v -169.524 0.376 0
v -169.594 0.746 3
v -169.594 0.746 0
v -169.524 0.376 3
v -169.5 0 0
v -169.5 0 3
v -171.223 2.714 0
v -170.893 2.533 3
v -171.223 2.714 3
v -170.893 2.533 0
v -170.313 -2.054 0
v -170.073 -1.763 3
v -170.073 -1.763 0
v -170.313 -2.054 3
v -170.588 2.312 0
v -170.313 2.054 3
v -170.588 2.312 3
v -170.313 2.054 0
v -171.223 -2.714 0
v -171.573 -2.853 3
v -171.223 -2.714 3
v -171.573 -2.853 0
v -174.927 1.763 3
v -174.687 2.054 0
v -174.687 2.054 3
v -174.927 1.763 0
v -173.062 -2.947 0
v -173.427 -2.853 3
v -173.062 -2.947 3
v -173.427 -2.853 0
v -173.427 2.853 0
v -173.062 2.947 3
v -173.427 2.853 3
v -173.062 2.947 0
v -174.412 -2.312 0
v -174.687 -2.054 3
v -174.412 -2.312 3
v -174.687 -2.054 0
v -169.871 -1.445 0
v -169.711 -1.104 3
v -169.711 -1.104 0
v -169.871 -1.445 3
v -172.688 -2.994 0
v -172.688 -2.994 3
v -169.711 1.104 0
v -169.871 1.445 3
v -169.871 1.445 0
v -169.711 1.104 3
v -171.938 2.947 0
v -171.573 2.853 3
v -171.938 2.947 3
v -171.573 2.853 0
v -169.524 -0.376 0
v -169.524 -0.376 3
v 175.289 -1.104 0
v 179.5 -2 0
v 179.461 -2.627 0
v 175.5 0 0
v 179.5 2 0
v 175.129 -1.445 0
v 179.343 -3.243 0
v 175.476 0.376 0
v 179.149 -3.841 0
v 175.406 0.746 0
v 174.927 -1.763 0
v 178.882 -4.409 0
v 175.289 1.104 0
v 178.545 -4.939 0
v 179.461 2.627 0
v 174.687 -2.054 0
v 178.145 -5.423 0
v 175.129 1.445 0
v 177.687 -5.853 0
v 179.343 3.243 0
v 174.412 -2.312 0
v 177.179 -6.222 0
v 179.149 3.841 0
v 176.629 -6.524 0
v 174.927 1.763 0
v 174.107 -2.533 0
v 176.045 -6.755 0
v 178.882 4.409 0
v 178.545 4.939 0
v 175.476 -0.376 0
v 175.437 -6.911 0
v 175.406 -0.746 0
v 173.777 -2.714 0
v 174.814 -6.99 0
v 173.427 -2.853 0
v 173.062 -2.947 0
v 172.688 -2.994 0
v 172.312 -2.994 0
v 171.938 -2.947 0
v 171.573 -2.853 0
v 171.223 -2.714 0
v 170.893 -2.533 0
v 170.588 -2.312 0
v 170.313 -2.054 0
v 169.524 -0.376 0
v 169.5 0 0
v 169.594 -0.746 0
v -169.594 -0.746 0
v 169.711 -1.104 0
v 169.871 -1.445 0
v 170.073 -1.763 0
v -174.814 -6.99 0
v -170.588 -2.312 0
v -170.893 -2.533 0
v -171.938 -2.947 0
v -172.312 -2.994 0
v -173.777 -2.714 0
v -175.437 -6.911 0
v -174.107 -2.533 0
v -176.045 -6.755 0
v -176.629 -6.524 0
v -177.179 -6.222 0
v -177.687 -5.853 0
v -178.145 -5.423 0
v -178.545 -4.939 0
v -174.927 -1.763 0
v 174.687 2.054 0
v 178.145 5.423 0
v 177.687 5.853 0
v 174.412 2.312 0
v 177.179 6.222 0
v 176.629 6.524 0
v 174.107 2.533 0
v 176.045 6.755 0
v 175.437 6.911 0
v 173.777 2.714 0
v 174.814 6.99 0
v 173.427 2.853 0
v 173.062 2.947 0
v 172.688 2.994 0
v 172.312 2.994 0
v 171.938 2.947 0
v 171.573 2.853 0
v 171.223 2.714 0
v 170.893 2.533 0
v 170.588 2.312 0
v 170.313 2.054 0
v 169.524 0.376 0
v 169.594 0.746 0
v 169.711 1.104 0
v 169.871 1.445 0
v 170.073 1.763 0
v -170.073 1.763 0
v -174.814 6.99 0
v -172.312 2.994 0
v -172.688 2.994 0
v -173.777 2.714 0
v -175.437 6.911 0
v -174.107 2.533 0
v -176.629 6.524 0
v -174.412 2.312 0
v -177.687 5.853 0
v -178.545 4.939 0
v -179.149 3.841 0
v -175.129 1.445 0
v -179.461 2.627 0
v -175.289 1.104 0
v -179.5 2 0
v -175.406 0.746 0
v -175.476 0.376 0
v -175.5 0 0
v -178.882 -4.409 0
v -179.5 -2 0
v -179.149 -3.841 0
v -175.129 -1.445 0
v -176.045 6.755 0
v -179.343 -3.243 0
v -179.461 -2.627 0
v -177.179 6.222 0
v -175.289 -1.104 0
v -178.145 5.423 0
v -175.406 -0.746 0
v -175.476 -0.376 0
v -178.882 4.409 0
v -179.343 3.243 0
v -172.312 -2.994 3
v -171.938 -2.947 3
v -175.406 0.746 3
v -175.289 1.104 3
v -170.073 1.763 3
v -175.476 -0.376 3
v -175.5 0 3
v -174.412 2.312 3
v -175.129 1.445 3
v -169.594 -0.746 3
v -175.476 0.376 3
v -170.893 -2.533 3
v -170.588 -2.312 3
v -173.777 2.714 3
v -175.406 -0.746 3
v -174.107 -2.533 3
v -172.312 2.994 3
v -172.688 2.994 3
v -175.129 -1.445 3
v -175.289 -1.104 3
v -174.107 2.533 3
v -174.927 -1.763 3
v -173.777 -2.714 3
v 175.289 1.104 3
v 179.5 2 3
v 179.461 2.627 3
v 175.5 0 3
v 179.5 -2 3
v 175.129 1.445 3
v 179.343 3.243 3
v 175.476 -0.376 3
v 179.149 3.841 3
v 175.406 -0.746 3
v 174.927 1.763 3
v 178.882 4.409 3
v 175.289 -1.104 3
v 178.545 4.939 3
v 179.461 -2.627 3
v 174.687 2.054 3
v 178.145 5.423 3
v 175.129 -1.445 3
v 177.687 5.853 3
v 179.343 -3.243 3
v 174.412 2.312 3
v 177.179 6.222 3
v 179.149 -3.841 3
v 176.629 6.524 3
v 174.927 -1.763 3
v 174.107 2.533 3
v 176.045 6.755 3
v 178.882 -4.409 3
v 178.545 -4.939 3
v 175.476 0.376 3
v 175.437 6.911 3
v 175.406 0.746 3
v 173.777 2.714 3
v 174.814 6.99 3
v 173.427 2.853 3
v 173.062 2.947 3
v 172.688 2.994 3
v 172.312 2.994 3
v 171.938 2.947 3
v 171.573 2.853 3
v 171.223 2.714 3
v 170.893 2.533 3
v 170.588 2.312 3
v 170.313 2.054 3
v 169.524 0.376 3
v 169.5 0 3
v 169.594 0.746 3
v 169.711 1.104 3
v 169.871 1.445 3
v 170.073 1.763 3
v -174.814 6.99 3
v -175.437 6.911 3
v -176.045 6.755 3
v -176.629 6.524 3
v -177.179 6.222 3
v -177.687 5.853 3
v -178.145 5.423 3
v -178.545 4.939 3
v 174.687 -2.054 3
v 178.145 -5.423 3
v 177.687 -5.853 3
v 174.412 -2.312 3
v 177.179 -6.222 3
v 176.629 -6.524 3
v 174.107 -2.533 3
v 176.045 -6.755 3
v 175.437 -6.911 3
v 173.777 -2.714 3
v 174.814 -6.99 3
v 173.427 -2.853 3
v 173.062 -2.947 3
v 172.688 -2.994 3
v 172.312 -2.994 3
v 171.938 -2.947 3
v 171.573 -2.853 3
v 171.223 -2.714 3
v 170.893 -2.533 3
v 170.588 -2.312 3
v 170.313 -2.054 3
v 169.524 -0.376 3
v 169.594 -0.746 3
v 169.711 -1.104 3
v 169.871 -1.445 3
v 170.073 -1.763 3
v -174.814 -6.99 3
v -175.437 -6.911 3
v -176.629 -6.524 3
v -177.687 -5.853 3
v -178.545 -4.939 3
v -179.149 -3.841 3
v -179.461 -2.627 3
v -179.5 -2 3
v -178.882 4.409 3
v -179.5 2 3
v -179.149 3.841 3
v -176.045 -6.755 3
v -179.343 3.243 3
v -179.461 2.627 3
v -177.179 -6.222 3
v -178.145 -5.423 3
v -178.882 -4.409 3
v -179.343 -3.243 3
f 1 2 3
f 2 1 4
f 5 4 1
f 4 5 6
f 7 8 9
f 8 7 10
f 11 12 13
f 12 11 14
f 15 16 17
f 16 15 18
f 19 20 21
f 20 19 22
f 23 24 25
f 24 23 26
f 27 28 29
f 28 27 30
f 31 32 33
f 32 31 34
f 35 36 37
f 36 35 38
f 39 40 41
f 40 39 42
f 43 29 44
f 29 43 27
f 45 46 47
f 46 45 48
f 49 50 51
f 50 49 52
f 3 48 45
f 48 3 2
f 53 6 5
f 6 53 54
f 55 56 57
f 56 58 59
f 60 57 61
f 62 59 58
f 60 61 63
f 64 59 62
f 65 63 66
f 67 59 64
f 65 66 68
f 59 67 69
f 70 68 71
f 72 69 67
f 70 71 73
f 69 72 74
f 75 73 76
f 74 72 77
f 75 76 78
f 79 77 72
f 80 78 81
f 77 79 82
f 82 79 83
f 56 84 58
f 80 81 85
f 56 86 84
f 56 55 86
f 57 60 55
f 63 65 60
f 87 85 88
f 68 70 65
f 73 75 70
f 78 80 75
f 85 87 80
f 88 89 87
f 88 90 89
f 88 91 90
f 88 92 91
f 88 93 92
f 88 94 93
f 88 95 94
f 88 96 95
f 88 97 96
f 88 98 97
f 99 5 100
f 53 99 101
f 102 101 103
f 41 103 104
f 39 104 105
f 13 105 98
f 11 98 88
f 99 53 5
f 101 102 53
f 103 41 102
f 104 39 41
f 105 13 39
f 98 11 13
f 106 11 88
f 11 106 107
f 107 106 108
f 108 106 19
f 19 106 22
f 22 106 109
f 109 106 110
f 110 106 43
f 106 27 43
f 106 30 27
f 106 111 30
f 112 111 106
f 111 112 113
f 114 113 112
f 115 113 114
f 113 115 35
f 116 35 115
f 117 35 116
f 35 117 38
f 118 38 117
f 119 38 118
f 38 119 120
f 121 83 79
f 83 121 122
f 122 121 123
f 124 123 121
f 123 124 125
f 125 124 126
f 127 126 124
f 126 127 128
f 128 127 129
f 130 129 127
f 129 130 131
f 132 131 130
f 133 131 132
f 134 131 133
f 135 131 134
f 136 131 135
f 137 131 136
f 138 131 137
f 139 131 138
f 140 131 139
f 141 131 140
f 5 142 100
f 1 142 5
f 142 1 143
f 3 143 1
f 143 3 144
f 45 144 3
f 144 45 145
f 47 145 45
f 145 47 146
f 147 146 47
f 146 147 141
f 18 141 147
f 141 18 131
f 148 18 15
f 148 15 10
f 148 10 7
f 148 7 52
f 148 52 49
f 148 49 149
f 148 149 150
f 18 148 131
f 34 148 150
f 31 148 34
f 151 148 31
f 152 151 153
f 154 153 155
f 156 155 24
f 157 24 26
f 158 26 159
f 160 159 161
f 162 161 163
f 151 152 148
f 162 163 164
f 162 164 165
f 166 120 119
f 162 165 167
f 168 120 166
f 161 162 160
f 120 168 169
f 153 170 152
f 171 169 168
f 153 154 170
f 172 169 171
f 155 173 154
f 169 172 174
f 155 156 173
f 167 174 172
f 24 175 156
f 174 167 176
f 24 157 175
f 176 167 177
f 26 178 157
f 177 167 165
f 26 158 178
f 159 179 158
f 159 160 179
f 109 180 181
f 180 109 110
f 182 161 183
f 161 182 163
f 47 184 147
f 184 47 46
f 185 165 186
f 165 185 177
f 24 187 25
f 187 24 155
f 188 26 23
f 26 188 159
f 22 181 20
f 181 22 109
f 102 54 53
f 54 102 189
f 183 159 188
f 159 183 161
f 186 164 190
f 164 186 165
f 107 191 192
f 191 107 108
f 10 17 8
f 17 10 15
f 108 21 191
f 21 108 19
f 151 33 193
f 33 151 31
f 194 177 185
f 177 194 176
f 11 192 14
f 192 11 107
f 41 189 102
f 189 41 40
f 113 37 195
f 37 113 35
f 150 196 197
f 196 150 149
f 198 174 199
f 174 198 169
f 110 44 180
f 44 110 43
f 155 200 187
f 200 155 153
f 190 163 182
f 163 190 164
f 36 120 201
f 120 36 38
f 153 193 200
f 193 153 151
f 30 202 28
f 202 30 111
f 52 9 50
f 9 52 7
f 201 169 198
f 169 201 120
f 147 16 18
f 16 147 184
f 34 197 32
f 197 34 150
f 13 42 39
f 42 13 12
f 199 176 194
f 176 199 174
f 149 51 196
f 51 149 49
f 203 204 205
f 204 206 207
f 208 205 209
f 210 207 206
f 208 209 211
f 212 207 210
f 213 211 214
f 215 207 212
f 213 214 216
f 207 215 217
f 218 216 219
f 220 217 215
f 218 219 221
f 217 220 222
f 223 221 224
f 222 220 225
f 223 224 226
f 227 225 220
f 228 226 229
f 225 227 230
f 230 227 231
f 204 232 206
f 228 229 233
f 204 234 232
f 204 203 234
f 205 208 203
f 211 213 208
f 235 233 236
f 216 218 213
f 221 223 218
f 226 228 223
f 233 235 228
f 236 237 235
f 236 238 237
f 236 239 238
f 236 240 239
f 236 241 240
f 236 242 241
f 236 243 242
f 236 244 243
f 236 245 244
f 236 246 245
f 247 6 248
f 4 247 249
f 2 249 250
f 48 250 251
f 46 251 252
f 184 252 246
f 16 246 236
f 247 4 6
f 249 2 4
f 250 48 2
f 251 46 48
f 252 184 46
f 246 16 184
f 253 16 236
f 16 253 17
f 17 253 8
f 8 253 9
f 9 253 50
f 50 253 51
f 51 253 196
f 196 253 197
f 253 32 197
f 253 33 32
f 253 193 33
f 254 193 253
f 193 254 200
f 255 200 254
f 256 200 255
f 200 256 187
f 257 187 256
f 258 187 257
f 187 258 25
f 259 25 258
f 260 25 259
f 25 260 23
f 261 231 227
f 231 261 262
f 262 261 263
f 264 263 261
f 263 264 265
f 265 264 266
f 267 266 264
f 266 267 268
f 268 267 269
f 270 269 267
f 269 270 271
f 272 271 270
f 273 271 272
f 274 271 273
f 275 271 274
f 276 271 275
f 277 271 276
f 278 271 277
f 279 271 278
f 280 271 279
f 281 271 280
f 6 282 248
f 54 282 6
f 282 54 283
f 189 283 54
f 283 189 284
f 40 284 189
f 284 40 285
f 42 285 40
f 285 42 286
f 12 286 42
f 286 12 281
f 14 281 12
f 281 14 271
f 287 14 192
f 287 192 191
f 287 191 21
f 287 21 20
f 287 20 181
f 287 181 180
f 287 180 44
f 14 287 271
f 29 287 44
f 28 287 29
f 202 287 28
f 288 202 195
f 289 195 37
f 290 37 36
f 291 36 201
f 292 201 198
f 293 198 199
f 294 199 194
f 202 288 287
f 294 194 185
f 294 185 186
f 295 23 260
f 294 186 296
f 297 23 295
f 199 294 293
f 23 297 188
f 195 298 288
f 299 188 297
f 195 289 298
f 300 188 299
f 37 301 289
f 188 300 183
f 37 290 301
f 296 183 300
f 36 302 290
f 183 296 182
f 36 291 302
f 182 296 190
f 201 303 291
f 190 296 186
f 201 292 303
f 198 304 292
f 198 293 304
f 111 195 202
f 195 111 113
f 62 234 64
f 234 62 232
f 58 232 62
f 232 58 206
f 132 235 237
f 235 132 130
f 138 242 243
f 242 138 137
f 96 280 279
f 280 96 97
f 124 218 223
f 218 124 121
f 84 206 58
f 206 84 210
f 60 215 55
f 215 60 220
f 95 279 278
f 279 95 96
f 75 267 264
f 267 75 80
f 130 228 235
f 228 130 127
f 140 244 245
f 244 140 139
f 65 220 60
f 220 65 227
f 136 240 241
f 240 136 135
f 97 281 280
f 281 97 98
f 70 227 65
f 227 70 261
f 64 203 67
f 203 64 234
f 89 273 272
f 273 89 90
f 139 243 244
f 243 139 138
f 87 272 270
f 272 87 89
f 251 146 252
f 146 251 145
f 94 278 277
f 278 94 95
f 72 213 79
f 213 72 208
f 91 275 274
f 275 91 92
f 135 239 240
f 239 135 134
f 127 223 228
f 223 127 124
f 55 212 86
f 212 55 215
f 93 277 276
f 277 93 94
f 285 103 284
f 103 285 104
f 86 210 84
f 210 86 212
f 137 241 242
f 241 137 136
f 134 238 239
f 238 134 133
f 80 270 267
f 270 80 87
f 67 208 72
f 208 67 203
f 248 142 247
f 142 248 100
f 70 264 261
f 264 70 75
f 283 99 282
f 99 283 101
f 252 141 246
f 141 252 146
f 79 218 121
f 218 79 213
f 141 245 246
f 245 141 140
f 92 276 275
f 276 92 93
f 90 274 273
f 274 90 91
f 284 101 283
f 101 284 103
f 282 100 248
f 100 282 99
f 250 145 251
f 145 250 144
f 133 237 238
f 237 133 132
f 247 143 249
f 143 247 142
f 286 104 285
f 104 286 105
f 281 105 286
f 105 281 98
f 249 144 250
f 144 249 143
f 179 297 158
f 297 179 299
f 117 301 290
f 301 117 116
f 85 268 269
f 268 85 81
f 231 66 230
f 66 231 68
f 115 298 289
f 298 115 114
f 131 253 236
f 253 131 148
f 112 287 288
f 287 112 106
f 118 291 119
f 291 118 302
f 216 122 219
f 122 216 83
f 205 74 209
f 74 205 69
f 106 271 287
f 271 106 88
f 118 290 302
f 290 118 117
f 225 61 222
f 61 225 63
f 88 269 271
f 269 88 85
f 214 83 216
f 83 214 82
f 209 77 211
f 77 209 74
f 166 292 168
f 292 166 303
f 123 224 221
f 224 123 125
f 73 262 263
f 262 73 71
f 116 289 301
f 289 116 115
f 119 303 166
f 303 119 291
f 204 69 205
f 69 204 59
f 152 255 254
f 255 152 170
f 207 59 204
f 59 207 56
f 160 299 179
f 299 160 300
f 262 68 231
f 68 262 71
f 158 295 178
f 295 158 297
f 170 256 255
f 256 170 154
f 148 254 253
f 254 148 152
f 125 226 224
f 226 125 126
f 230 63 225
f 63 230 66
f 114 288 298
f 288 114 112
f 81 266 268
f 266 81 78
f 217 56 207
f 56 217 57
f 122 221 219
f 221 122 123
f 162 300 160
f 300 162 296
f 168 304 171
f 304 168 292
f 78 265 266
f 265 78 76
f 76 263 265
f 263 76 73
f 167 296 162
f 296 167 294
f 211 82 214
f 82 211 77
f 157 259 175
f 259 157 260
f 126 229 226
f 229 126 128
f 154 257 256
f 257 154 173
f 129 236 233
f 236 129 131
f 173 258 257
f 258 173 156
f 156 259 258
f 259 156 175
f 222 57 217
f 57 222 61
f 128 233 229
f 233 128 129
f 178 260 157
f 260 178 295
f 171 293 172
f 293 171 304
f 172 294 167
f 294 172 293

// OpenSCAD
$fn = 50;


difference() {
	union() {
		hull() {
			translate(v = [-174.5000000000, 2.0000000000, 0]) {
				cylinder(h = 3, r = 5);
			}
			translate(v = [174.5000000000, 2.0000000000, 0]) {
				cylinder(h = 3, r = 5);
			}
			translate(v = [-174.5000000000, -2.0000000000, 0]) {
				cylinder(h = 3, r = 5);
			}
			translate(v = [174.5000000000, -2.0000000000, 0]) {
				cylinder(h = 3, r = 5);
			}
		}
	}
	union() {
		translate(v = [-172.5000000000, 0.0000000000, 0]) {
			cylinder(h = 3, r = 3.0000000000);
		}
		translate(v = [172.5000000000, 0.0000000000, 0]) {
			cylinder(h = 3, r = 3.0000000000);
		}
		translate(v = [-172.5000000000, 0.0000000000, 0]) {
			cylinder(h = 3, r = 1.5000000000);
		}
		translate(v = [172.5000000000, 0.0000000000, 0]) {
			cylinder(h = 3, r = 1.5000000000);
		}
		translate(v = [-172.5000000000, 0.0000000000, 0]) {
			cylinder(h = 3, r = 1.5000000000);
		}
		translate(v = [172.5000000000, 0.0000000000, 0]) {
			cylinder(h = 3, r = 1.5000000000);
		}
		translate(v = [-172.5000000000, 0.0000000000, 0]) {
			cylinder(h = 3, r = 1.5000000000);
		}
		translate(v = [172.5000000000, 0.0000000000, 0]) {
			cylinder(h = 3, r = 1.5000000000);
		}
	}
}
